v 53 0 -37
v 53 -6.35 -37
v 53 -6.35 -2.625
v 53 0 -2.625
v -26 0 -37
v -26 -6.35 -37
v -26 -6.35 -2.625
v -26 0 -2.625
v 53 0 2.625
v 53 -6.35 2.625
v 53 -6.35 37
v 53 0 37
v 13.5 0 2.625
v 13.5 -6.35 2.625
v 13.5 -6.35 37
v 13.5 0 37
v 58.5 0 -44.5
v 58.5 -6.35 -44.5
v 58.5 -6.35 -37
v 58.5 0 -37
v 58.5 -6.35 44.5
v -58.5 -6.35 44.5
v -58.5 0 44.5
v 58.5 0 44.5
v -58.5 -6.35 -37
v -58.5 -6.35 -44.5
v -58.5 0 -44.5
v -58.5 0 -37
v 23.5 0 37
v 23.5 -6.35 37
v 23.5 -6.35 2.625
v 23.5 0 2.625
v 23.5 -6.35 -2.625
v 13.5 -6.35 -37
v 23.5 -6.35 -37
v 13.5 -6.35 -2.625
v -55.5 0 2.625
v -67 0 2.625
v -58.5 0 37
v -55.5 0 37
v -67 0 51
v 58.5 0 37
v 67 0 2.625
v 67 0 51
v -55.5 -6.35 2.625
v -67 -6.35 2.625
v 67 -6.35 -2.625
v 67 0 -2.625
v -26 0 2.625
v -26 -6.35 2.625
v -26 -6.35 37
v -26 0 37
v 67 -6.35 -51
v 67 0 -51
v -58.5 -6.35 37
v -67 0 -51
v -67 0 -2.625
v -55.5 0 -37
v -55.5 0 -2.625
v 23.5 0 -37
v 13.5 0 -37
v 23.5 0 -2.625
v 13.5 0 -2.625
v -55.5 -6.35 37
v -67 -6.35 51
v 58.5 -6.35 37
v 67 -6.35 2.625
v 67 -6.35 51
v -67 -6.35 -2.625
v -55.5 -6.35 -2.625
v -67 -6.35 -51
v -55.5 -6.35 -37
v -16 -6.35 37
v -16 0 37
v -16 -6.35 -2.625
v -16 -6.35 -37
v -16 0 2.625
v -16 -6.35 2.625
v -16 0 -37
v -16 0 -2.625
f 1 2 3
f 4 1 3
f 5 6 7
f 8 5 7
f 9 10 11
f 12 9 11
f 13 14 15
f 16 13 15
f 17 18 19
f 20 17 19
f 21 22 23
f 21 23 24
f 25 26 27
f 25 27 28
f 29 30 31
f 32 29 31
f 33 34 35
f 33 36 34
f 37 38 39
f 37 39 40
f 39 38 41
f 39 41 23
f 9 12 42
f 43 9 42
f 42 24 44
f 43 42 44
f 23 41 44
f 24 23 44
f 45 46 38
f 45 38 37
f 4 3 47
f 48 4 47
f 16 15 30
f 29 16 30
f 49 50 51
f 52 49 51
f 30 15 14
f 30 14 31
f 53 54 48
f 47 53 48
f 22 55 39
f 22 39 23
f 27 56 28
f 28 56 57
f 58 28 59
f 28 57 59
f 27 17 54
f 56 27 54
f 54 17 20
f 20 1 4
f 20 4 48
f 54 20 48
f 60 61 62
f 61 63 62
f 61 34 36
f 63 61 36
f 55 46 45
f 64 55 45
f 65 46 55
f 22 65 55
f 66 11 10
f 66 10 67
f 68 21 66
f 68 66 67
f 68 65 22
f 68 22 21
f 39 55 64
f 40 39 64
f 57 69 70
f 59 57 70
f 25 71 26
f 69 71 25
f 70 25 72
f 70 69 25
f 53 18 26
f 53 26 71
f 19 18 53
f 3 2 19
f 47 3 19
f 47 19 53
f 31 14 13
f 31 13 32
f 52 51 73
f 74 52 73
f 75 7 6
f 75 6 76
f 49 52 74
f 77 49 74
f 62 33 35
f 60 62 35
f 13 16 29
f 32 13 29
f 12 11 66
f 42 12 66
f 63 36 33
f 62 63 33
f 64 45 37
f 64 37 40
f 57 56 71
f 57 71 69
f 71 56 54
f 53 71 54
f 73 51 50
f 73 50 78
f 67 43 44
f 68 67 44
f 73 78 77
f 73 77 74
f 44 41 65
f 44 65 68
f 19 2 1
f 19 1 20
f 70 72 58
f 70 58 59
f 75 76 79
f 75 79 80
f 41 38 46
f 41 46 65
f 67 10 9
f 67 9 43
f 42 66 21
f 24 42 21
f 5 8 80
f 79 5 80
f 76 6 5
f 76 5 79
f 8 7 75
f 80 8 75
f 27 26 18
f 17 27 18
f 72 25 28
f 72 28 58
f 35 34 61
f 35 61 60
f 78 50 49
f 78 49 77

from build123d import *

# Parameters (mm, degrees)
F0_W     = 134
F0_H     = 102
F1_DEPTH = 6.35
F2_W     = 29.5
F2_H     = 79.6
F3_DEPTH = 12.7
F4_W     = 117
F4_H     = 7.5
F4_W_2   = 134
F4_H_2   = 5.25
F5_DEPTH = 6.35


with BuildPart() as f1:
    # F0 (on Front) → F1 (new body)
    with BuildSketch(Plane.XZ):
        Rectangle(F0_W, F0_H)
    extrude(amount=F1_DEPTH)

    # F2 (on face) → F3 (cut)
    with BuildSketch(Plane.XZ.offset(6.35)):
        with Locations((-1.25, 0)):
            Rectangle(F2_W, F2_H)
        Polygon((53, 39.8), (23.5, 39.8), (23.5, -39.8), (53, -39.8), (53, -16.022205), align=None)
        with Locations((-40.75, 0)):
            Rectangle(F2_W, F2_H)
    extrude(amount=-F3_DEPTH, mode=Mode.SUBTRACT)

    # F4 (on face) → F5 (cut)
    with BuildSketch(Plane.XZ.offset(6.35)):
        with Locations((0, 40.75)):
            Rectangle(F4_W, F4_H)
        Rectangle(F4_W_2, F4_H_2)
        with Locations((0, -40.75)):
            Rectangle(F4_W, F4_H)
    extrude(amount=-F5_DEPTH, mode=Mode.SUBTRACT)


solid = f1.part
